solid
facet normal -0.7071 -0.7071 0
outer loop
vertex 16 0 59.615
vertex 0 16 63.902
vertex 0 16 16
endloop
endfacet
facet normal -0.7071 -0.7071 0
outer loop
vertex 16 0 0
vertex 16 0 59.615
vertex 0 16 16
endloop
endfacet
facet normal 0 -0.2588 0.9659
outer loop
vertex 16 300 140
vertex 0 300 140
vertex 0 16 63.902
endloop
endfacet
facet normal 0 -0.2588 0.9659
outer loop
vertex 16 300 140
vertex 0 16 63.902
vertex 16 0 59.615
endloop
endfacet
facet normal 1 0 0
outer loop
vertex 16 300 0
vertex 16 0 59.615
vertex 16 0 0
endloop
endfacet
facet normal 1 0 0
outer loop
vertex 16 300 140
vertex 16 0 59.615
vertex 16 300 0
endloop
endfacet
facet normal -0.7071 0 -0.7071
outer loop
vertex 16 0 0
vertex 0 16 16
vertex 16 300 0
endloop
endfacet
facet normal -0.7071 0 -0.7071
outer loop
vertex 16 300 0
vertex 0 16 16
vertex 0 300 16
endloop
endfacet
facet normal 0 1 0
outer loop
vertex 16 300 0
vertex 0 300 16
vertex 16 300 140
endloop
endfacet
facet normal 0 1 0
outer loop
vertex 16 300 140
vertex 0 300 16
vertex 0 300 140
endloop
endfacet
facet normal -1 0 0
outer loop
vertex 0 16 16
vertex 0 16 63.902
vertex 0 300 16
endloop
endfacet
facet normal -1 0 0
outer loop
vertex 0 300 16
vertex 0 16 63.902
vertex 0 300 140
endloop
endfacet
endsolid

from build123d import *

# Parameters (mm, degrees)
F1_DEPTH = 16
F2_SIZE  = 15.99999


# Not quite as in the source:
# - a fillet or chamfer is up to 0.001 mm smaller than in the source, because OpenCascade refuses the exact size


with BuildPart() as f1:
    # F0 (on Right) → F1 (new body)
    with BuildSketch(Plane.YZ):
        Polygon((0, 59.6152422707), (0, 0), (300, 0), (300, 140), align=None)
    extrude(amount=F1_DEPTH)

    # F2 (size 16 in the source; OpenCascade refuses exactly that, so slightly less here)
    f2_edges = [f1.edges().sort_by_distance(p)[0] for p in [
        (0, 0, 29.807621),
        (0, 150, 0),
    ]]
    chamfer(f2_edges, length=F2_SIZE)


solid = f1.part
